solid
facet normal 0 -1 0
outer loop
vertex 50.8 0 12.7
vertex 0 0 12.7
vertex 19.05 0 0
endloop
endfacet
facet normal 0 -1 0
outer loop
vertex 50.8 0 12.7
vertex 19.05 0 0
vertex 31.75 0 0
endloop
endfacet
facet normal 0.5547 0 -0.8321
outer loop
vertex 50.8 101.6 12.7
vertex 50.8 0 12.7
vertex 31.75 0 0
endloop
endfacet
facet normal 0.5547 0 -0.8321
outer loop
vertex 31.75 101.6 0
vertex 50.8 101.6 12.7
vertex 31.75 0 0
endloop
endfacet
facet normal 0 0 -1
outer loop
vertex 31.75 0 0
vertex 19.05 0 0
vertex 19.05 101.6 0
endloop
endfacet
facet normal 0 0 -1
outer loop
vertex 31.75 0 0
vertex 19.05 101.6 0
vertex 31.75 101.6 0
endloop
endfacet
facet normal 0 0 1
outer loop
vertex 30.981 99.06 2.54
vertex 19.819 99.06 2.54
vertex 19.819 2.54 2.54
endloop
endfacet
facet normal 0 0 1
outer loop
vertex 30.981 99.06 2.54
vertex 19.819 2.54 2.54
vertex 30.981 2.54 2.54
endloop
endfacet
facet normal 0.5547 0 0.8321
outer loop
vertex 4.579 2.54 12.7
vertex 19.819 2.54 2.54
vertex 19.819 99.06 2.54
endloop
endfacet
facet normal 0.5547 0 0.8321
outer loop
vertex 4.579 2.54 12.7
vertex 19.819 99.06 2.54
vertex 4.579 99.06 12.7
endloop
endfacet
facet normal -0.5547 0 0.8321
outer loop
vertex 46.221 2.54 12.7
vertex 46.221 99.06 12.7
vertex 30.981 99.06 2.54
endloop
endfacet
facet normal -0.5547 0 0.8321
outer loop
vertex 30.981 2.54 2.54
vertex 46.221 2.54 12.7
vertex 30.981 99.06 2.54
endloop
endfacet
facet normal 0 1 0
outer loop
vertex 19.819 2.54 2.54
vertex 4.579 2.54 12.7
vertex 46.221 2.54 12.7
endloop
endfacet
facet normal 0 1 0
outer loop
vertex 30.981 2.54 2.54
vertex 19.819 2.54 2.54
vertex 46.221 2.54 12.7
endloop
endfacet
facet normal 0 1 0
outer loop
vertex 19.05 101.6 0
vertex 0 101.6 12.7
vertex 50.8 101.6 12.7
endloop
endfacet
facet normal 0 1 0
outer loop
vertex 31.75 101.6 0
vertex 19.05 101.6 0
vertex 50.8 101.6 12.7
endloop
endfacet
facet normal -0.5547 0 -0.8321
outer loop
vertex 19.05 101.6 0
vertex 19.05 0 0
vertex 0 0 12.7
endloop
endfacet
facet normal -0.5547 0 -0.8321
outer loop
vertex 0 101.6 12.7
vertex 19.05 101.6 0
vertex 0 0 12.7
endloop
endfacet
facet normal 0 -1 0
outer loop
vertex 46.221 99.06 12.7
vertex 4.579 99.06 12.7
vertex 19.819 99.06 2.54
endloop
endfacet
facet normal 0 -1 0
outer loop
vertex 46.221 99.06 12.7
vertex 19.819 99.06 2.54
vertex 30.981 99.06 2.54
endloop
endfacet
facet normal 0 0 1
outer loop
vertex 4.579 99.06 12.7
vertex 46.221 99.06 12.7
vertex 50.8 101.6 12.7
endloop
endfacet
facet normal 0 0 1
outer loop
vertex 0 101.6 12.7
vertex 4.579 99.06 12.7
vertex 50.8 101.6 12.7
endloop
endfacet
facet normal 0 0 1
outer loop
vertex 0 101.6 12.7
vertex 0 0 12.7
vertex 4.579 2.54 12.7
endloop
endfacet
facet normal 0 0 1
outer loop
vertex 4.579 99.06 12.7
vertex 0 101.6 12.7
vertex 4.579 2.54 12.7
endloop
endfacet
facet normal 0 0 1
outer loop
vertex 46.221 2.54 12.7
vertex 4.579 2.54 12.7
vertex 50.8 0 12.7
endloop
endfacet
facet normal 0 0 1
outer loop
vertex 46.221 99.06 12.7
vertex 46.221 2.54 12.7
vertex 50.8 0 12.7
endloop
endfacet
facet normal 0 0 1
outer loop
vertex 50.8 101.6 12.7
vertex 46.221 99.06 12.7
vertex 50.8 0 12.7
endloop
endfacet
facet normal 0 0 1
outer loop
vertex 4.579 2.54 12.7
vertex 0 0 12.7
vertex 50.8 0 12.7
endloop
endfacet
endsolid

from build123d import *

# Parameters (mm, degrees)
F0_W     = 50.8
F0_H     = 12.7
F1_DEPTH = 101.6
F3_DEPTH = 101.6
F5_DEPTH = 101.6
F6_T     = -2.54


with BuildPart() as f1:
    # F0 (on Front) → F1 (new body)
    with BuildSketch(Plane.XZ):
        with Locations((25.4, 6.35)):
            Rectangle(F0_W, F0_H)
    extrude(amount=-F1_DEPTH)

    # F2 (on face) → F3 (cut)
    with BuildSketch(Plane.XZ):
        Polygon((0, 12.7), (0, 0), (19.05, 0), align=None)
    extrude(amount=-F3_DEPTH, mode=Mode.SUBTRACT)

    # F4 (on face) → F5 (cut)
    with BuildSketch(Plane.XZ):
        Polygon((31.75, 0), (50.8, 0), (50.8, 12.7), align=None)
    extrude(amount=-F5_DEPTH, mode=Mode.SUBTRACT)

    # F6
    f6_openings = [f1.faces().sort_by_distance(p)[0] for p in [
        (25.4, 50.8, 12.7),
    ]]
    offset(amount=F6_T, openings=f6_openings)


solid = f1.part
